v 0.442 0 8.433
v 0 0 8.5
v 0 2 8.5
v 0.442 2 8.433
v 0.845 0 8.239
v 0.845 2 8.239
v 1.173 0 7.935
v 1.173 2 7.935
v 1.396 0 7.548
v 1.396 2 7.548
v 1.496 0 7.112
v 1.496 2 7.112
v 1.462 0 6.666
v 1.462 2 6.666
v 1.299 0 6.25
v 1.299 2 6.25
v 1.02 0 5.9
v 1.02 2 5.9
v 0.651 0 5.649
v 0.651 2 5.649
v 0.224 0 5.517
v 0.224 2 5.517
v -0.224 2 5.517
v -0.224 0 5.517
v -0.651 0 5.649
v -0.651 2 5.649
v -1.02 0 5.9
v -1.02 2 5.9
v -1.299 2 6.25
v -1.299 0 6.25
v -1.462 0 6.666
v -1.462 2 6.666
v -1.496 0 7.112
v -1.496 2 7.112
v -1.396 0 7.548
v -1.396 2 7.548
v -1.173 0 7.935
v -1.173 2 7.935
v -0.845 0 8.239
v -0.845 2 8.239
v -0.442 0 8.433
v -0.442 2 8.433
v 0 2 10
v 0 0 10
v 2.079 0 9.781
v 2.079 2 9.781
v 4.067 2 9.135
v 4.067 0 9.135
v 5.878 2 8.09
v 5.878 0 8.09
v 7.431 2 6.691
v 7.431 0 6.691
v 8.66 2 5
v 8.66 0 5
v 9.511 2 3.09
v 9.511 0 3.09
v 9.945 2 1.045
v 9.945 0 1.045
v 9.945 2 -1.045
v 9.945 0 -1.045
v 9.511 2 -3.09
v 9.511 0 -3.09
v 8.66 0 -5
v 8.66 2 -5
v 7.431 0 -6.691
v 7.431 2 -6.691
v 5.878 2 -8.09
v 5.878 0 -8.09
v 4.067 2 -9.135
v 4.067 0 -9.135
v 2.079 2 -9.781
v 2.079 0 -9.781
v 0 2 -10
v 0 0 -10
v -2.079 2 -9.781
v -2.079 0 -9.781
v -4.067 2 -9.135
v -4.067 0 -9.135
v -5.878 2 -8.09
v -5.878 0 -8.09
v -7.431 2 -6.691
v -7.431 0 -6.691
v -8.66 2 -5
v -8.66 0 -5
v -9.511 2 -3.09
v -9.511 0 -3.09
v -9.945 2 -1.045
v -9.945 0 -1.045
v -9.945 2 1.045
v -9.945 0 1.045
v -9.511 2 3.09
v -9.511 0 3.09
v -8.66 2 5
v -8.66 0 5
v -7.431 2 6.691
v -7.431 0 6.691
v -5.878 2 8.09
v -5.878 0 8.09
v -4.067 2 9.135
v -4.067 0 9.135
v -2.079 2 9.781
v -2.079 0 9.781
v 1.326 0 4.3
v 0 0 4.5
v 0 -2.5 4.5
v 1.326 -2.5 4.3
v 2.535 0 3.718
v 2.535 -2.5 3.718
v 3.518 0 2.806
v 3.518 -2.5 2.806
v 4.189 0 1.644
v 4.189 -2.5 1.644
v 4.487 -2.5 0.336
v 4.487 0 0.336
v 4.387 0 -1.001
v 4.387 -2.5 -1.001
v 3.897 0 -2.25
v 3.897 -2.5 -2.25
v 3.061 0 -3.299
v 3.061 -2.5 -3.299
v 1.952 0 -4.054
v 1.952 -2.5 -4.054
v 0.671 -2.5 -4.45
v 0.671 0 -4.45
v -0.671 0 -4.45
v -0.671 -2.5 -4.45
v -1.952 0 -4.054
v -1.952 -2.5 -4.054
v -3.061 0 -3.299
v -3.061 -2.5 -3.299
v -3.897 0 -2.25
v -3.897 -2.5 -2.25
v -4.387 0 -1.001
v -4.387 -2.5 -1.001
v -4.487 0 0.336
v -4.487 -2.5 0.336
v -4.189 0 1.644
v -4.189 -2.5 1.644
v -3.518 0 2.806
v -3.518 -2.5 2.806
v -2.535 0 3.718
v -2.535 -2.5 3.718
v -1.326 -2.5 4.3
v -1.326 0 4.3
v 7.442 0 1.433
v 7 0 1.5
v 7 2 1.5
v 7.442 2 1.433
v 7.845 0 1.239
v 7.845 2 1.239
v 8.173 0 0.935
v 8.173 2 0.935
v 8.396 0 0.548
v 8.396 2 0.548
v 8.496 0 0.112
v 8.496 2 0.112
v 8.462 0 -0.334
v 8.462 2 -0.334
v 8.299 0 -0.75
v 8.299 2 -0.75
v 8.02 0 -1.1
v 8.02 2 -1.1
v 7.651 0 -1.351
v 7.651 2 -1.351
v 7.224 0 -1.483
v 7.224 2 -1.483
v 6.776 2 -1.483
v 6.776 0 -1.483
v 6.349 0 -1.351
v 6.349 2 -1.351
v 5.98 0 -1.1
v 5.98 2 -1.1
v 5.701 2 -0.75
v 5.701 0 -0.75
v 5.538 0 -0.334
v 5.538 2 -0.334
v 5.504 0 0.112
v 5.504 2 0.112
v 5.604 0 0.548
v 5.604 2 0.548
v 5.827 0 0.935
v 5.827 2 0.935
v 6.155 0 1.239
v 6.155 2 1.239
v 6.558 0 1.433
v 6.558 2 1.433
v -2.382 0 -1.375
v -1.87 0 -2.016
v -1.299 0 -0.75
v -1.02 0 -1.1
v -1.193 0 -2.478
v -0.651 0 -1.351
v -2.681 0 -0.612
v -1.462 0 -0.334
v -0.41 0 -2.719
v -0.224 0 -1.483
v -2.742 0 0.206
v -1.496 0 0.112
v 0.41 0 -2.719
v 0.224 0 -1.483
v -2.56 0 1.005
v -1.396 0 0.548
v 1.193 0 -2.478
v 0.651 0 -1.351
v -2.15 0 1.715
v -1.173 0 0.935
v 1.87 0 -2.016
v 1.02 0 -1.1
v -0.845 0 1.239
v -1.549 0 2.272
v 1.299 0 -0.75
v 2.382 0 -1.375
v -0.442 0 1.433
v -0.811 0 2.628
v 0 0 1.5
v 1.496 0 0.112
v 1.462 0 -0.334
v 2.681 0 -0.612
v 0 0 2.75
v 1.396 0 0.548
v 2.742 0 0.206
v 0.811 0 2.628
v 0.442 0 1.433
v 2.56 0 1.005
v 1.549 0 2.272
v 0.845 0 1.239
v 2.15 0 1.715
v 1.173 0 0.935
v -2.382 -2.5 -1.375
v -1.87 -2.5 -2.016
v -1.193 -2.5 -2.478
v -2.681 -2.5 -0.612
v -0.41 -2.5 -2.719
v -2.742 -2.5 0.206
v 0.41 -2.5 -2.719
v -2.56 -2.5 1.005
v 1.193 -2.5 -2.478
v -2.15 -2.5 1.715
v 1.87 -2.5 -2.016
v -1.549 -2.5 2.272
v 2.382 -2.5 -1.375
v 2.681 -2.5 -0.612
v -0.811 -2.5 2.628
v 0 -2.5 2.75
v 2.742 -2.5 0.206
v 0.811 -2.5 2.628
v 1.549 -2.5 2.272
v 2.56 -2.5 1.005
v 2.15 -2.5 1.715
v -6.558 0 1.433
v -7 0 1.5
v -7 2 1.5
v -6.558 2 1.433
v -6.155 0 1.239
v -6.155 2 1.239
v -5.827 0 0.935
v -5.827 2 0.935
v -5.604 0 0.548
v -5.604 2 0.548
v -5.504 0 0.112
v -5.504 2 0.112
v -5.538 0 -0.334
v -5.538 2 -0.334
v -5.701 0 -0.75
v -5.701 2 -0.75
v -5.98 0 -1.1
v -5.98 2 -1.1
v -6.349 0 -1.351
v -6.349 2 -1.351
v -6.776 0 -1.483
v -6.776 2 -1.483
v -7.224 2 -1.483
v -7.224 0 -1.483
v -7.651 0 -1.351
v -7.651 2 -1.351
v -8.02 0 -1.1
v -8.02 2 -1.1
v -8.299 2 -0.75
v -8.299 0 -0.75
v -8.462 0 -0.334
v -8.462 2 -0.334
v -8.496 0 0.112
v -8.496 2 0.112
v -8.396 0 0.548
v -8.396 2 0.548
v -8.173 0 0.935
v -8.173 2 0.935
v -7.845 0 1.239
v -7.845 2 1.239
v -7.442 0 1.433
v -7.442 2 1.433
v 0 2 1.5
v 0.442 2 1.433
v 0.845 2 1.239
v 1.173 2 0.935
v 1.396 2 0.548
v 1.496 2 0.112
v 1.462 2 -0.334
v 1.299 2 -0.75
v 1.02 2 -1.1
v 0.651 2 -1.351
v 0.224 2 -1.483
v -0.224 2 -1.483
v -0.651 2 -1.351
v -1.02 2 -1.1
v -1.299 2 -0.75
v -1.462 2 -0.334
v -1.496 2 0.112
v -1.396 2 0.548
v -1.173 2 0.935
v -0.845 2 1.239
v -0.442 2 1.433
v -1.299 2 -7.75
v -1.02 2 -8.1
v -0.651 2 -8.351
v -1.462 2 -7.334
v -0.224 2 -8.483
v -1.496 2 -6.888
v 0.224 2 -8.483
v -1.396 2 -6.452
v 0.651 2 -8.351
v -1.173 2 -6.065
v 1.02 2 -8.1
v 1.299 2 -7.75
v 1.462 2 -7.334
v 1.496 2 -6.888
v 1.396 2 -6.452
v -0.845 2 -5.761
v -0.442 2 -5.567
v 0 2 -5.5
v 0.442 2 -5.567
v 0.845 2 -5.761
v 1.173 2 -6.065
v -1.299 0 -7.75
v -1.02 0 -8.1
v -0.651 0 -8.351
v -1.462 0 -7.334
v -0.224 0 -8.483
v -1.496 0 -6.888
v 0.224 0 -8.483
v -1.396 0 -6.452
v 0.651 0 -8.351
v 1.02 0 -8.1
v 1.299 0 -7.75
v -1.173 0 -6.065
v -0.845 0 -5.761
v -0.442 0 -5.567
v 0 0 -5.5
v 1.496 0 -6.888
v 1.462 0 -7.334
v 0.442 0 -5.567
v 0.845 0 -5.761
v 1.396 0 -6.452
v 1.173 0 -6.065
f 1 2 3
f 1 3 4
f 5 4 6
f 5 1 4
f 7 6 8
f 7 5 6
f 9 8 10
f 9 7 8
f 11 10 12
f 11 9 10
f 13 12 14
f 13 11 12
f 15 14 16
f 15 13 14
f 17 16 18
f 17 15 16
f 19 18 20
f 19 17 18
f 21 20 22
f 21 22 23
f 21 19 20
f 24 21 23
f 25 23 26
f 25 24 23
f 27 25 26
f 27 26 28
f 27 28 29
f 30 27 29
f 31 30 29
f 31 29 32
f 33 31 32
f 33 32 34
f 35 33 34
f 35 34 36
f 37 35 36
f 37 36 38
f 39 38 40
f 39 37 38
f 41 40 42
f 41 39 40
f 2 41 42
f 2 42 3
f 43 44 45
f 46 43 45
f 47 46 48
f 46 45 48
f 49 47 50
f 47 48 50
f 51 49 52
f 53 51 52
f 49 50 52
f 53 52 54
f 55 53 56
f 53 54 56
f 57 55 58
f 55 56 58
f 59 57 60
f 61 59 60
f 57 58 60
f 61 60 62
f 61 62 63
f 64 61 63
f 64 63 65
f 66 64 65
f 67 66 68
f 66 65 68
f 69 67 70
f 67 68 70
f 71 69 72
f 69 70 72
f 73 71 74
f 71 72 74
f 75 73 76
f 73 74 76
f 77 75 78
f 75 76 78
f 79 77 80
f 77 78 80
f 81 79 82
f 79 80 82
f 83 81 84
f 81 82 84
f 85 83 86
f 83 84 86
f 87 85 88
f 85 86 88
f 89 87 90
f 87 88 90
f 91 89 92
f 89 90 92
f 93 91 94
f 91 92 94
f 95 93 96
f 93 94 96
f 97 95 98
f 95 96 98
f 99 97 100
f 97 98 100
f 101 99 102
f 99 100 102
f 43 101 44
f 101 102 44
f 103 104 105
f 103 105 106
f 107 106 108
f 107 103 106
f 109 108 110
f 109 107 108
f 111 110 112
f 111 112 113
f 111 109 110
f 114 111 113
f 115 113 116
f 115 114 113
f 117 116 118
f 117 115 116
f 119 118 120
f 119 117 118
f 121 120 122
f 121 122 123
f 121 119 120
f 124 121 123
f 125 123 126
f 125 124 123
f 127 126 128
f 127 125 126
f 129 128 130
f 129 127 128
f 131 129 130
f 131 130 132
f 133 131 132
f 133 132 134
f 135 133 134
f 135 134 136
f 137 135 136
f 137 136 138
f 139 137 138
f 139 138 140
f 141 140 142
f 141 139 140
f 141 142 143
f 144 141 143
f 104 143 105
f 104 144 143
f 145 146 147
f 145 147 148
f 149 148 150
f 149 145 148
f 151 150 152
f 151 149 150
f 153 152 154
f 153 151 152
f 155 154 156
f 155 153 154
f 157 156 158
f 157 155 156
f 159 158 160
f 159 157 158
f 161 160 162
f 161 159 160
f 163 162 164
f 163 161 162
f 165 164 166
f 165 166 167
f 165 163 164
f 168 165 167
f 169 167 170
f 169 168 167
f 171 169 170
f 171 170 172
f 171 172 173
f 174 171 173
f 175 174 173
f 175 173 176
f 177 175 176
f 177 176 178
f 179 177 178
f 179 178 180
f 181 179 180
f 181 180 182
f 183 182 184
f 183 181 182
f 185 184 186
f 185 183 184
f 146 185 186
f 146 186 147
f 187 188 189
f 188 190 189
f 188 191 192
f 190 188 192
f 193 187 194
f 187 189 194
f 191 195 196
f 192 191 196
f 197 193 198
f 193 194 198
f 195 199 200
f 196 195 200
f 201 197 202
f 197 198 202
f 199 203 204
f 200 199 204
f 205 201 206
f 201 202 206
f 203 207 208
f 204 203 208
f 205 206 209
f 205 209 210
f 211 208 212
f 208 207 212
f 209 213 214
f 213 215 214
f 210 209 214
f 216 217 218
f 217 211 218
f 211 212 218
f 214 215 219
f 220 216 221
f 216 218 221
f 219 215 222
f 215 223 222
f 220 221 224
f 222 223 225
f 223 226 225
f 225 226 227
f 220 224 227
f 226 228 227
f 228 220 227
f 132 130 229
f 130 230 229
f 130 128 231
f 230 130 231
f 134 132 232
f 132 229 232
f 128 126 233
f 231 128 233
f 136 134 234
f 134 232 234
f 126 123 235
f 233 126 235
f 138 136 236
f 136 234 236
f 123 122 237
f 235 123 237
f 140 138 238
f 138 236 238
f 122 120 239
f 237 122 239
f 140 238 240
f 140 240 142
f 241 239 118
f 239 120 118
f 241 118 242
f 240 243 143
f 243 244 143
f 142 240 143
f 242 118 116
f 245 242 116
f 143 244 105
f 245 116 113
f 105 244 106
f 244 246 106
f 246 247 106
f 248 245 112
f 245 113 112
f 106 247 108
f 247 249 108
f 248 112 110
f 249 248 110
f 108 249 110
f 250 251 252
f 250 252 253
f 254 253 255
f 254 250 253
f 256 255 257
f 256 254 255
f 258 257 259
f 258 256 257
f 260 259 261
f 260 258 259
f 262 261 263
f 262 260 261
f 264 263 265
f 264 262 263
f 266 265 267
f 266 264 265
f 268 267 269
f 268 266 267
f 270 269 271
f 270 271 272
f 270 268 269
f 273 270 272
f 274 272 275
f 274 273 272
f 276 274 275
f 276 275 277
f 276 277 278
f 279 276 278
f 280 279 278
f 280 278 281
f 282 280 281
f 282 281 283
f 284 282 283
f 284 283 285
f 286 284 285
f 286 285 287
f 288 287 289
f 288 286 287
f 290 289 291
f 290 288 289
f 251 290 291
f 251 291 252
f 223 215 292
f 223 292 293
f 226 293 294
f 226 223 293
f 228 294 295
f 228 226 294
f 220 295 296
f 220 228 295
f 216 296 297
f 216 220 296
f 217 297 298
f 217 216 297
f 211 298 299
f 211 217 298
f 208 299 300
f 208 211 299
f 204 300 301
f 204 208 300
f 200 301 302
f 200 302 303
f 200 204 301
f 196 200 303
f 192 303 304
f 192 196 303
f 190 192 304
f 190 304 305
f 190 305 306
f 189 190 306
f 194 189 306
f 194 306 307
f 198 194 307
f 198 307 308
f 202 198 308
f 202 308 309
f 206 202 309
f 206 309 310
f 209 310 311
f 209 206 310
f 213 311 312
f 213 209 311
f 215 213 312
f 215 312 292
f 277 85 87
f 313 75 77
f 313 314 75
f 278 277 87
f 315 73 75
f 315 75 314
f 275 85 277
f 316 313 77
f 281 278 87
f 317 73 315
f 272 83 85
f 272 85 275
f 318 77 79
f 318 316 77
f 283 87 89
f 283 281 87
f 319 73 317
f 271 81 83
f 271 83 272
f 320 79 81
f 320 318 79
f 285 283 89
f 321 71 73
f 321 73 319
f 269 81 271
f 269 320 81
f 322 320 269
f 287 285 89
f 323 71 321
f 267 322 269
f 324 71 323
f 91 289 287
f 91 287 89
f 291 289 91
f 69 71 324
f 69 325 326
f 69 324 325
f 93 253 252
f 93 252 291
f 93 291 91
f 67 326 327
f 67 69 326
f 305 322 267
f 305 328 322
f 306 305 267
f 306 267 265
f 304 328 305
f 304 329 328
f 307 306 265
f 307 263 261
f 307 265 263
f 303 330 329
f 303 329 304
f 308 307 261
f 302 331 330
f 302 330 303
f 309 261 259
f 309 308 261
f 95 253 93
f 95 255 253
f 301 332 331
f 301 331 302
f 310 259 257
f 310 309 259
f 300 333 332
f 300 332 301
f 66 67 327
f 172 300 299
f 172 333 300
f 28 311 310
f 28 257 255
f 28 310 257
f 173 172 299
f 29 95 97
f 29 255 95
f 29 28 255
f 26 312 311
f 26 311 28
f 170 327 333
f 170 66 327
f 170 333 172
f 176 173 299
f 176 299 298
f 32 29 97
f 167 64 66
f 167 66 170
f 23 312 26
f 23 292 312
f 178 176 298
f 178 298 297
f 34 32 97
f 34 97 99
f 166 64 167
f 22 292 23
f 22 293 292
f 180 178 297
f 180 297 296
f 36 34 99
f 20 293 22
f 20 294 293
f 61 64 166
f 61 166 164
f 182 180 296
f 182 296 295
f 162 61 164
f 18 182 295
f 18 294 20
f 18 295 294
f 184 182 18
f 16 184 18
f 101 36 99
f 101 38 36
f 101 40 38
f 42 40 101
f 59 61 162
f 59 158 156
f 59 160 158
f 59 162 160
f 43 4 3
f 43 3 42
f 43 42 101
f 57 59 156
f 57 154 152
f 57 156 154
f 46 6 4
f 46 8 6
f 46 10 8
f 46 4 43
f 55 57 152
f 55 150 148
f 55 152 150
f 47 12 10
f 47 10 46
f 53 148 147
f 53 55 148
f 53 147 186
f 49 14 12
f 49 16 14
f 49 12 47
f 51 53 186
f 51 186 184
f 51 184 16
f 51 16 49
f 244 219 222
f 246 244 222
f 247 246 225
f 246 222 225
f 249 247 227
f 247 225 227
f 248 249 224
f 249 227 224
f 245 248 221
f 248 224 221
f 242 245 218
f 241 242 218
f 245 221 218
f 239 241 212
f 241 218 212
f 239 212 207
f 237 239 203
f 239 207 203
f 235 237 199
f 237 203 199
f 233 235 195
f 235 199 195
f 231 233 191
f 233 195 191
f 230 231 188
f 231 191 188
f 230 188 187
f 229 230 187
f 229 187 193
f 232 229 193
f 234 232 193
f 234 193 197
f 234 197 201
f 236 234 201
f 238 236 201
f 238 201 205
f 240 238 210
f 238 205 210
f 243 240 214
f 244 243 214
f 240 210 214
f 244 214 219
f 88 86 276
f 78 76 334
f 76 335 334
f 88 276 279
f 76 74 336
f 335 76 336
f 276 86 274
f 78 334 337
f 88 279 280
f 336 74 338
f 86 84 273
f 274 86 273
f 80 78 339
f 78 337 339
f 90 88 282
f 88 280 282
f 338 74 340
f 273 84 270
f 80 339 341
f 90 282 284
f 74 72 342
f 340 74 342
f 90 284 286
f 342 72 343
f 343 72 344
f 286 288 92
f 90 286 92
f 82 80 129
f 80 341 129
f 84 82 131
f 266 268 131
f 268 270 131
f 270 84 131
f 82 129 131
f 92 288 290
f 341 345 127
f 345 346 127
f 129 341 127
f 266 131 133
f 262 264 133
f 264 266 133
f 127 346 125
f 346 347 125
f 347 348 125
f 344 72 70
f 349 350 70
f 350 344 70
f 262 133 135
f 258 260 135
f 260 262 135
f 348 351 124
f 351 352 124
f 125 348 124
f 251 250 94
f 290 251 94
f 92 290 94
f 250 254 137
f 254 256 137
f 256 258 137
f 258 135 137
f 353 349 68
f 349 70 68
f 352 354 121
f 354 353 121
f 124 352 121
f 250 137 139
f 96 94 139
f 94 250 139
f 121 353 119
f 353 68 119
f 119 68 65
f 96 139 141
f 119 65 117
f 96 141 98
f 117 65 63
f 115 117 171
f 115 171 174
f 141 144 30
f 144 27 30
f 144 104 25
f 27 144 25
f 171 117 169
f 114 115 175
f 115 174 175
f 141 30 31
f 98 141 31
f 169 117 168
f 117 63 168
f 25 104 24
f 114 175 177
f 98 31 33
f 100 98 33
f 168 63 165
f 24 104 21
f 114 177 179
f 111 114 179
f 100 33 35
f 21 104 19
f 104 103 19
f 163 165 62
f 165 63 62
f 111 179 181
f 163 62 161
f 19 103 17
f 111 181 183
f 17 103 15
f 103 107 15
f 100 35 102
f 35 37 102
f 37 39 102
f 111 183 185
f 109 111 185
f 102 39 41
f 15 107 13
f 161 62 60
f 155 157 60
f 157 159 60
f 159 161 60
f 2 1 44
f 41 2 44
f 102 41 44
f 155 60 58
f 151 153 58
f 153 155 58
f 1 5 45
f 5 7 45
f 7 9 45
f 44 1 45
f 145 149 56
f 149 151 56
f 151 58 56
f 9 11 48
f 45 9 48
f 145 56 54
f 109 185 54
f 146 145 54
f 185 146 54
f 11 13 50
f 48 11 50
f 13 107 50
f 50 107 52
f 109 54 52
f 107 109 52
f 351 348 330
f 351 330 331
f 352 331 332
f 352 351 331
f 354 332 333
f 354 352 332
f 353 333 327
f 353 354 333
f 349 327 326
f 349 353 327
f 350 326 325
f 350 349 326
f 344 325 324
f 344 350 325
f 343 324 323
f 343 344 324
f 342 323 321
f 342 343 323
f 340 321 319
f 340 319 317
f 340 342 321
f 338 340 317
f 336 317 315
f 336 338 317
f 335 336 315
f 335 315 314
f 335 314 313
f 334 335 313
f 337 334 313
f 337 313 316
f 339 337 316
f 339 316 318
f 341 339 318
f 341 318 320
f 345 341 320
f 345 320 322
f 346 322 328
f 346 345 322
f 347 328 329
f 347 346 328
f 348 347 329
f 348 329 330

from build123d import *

# Parameters (mm, degrees)
SKETCH_1_R      = 10
SKETCH_1_R_2    = 1.5
EXTRUDE_1_DEPTH = 2
SKETCH_2_R      = 4.5
SKETCH_2_R_2    = 2.75
EXTRUDE_2_DEPTH = 2.5


with BuildPart() as part:
    # 草图1 → 凸台-拉伸1 (new body)
    with BuildSketch(Plane(origin=(0, 0, 0), x_dir=(1, 0, 0), z_dir=(0, 1, 0))):
        with Locations(Location((0, 0, 0), (0, 0, 270))):
            Circle(SKETCH_1_R)
        with Locations(Location((-7, 0, 0), (0, 0, 270))):
            Circle(SKETCH_1_R_2, mode=Mode.SUBTRACT)
        with Locations(Location((0, 7, 0), (0, 0, 270))):
            Circle(SKETCH_1_R_2, mode=Mode.SUBTRACT)
        with Locations(Location((7, 0, 0), (0, 0, 270))):
            Circle(SKETCH_1_R_2, mode=Mode.SUBTRACT)
        with Locations(Location((0, -7, 0), (0, 0, 270))):
            Circle(SKETCH_1_R_2, mode=Mode.SUBTRACT)
        with Locations(Location((0, 0, 0), (0, 0, 270))):
            Circle(SKETCH_1_R_2, mode=Mode.SUBTRACT)
    extrude(amount=EXTRUDE_1_DEPTH)

    # 草图2 → 凸台-拉伸2 (add)
    with BuildSketch(Plane(origin=(0, 0, 0), x_dir=(1, 0, 0), z_dir=(0, 1, 0))):
        with Locations(Location((0, 0, 0), (0, 0, 270))):
            Circle(SKETCH_2_R)
        with Locations(Location((0, 0, 0), (0, 0, 270))):
            Circle(SKETCH_2_R_2, mode=Mode.SUBTRACT)
    extrude(amount=-EXTRUDE_2_DEPTH)


solid = part.part
